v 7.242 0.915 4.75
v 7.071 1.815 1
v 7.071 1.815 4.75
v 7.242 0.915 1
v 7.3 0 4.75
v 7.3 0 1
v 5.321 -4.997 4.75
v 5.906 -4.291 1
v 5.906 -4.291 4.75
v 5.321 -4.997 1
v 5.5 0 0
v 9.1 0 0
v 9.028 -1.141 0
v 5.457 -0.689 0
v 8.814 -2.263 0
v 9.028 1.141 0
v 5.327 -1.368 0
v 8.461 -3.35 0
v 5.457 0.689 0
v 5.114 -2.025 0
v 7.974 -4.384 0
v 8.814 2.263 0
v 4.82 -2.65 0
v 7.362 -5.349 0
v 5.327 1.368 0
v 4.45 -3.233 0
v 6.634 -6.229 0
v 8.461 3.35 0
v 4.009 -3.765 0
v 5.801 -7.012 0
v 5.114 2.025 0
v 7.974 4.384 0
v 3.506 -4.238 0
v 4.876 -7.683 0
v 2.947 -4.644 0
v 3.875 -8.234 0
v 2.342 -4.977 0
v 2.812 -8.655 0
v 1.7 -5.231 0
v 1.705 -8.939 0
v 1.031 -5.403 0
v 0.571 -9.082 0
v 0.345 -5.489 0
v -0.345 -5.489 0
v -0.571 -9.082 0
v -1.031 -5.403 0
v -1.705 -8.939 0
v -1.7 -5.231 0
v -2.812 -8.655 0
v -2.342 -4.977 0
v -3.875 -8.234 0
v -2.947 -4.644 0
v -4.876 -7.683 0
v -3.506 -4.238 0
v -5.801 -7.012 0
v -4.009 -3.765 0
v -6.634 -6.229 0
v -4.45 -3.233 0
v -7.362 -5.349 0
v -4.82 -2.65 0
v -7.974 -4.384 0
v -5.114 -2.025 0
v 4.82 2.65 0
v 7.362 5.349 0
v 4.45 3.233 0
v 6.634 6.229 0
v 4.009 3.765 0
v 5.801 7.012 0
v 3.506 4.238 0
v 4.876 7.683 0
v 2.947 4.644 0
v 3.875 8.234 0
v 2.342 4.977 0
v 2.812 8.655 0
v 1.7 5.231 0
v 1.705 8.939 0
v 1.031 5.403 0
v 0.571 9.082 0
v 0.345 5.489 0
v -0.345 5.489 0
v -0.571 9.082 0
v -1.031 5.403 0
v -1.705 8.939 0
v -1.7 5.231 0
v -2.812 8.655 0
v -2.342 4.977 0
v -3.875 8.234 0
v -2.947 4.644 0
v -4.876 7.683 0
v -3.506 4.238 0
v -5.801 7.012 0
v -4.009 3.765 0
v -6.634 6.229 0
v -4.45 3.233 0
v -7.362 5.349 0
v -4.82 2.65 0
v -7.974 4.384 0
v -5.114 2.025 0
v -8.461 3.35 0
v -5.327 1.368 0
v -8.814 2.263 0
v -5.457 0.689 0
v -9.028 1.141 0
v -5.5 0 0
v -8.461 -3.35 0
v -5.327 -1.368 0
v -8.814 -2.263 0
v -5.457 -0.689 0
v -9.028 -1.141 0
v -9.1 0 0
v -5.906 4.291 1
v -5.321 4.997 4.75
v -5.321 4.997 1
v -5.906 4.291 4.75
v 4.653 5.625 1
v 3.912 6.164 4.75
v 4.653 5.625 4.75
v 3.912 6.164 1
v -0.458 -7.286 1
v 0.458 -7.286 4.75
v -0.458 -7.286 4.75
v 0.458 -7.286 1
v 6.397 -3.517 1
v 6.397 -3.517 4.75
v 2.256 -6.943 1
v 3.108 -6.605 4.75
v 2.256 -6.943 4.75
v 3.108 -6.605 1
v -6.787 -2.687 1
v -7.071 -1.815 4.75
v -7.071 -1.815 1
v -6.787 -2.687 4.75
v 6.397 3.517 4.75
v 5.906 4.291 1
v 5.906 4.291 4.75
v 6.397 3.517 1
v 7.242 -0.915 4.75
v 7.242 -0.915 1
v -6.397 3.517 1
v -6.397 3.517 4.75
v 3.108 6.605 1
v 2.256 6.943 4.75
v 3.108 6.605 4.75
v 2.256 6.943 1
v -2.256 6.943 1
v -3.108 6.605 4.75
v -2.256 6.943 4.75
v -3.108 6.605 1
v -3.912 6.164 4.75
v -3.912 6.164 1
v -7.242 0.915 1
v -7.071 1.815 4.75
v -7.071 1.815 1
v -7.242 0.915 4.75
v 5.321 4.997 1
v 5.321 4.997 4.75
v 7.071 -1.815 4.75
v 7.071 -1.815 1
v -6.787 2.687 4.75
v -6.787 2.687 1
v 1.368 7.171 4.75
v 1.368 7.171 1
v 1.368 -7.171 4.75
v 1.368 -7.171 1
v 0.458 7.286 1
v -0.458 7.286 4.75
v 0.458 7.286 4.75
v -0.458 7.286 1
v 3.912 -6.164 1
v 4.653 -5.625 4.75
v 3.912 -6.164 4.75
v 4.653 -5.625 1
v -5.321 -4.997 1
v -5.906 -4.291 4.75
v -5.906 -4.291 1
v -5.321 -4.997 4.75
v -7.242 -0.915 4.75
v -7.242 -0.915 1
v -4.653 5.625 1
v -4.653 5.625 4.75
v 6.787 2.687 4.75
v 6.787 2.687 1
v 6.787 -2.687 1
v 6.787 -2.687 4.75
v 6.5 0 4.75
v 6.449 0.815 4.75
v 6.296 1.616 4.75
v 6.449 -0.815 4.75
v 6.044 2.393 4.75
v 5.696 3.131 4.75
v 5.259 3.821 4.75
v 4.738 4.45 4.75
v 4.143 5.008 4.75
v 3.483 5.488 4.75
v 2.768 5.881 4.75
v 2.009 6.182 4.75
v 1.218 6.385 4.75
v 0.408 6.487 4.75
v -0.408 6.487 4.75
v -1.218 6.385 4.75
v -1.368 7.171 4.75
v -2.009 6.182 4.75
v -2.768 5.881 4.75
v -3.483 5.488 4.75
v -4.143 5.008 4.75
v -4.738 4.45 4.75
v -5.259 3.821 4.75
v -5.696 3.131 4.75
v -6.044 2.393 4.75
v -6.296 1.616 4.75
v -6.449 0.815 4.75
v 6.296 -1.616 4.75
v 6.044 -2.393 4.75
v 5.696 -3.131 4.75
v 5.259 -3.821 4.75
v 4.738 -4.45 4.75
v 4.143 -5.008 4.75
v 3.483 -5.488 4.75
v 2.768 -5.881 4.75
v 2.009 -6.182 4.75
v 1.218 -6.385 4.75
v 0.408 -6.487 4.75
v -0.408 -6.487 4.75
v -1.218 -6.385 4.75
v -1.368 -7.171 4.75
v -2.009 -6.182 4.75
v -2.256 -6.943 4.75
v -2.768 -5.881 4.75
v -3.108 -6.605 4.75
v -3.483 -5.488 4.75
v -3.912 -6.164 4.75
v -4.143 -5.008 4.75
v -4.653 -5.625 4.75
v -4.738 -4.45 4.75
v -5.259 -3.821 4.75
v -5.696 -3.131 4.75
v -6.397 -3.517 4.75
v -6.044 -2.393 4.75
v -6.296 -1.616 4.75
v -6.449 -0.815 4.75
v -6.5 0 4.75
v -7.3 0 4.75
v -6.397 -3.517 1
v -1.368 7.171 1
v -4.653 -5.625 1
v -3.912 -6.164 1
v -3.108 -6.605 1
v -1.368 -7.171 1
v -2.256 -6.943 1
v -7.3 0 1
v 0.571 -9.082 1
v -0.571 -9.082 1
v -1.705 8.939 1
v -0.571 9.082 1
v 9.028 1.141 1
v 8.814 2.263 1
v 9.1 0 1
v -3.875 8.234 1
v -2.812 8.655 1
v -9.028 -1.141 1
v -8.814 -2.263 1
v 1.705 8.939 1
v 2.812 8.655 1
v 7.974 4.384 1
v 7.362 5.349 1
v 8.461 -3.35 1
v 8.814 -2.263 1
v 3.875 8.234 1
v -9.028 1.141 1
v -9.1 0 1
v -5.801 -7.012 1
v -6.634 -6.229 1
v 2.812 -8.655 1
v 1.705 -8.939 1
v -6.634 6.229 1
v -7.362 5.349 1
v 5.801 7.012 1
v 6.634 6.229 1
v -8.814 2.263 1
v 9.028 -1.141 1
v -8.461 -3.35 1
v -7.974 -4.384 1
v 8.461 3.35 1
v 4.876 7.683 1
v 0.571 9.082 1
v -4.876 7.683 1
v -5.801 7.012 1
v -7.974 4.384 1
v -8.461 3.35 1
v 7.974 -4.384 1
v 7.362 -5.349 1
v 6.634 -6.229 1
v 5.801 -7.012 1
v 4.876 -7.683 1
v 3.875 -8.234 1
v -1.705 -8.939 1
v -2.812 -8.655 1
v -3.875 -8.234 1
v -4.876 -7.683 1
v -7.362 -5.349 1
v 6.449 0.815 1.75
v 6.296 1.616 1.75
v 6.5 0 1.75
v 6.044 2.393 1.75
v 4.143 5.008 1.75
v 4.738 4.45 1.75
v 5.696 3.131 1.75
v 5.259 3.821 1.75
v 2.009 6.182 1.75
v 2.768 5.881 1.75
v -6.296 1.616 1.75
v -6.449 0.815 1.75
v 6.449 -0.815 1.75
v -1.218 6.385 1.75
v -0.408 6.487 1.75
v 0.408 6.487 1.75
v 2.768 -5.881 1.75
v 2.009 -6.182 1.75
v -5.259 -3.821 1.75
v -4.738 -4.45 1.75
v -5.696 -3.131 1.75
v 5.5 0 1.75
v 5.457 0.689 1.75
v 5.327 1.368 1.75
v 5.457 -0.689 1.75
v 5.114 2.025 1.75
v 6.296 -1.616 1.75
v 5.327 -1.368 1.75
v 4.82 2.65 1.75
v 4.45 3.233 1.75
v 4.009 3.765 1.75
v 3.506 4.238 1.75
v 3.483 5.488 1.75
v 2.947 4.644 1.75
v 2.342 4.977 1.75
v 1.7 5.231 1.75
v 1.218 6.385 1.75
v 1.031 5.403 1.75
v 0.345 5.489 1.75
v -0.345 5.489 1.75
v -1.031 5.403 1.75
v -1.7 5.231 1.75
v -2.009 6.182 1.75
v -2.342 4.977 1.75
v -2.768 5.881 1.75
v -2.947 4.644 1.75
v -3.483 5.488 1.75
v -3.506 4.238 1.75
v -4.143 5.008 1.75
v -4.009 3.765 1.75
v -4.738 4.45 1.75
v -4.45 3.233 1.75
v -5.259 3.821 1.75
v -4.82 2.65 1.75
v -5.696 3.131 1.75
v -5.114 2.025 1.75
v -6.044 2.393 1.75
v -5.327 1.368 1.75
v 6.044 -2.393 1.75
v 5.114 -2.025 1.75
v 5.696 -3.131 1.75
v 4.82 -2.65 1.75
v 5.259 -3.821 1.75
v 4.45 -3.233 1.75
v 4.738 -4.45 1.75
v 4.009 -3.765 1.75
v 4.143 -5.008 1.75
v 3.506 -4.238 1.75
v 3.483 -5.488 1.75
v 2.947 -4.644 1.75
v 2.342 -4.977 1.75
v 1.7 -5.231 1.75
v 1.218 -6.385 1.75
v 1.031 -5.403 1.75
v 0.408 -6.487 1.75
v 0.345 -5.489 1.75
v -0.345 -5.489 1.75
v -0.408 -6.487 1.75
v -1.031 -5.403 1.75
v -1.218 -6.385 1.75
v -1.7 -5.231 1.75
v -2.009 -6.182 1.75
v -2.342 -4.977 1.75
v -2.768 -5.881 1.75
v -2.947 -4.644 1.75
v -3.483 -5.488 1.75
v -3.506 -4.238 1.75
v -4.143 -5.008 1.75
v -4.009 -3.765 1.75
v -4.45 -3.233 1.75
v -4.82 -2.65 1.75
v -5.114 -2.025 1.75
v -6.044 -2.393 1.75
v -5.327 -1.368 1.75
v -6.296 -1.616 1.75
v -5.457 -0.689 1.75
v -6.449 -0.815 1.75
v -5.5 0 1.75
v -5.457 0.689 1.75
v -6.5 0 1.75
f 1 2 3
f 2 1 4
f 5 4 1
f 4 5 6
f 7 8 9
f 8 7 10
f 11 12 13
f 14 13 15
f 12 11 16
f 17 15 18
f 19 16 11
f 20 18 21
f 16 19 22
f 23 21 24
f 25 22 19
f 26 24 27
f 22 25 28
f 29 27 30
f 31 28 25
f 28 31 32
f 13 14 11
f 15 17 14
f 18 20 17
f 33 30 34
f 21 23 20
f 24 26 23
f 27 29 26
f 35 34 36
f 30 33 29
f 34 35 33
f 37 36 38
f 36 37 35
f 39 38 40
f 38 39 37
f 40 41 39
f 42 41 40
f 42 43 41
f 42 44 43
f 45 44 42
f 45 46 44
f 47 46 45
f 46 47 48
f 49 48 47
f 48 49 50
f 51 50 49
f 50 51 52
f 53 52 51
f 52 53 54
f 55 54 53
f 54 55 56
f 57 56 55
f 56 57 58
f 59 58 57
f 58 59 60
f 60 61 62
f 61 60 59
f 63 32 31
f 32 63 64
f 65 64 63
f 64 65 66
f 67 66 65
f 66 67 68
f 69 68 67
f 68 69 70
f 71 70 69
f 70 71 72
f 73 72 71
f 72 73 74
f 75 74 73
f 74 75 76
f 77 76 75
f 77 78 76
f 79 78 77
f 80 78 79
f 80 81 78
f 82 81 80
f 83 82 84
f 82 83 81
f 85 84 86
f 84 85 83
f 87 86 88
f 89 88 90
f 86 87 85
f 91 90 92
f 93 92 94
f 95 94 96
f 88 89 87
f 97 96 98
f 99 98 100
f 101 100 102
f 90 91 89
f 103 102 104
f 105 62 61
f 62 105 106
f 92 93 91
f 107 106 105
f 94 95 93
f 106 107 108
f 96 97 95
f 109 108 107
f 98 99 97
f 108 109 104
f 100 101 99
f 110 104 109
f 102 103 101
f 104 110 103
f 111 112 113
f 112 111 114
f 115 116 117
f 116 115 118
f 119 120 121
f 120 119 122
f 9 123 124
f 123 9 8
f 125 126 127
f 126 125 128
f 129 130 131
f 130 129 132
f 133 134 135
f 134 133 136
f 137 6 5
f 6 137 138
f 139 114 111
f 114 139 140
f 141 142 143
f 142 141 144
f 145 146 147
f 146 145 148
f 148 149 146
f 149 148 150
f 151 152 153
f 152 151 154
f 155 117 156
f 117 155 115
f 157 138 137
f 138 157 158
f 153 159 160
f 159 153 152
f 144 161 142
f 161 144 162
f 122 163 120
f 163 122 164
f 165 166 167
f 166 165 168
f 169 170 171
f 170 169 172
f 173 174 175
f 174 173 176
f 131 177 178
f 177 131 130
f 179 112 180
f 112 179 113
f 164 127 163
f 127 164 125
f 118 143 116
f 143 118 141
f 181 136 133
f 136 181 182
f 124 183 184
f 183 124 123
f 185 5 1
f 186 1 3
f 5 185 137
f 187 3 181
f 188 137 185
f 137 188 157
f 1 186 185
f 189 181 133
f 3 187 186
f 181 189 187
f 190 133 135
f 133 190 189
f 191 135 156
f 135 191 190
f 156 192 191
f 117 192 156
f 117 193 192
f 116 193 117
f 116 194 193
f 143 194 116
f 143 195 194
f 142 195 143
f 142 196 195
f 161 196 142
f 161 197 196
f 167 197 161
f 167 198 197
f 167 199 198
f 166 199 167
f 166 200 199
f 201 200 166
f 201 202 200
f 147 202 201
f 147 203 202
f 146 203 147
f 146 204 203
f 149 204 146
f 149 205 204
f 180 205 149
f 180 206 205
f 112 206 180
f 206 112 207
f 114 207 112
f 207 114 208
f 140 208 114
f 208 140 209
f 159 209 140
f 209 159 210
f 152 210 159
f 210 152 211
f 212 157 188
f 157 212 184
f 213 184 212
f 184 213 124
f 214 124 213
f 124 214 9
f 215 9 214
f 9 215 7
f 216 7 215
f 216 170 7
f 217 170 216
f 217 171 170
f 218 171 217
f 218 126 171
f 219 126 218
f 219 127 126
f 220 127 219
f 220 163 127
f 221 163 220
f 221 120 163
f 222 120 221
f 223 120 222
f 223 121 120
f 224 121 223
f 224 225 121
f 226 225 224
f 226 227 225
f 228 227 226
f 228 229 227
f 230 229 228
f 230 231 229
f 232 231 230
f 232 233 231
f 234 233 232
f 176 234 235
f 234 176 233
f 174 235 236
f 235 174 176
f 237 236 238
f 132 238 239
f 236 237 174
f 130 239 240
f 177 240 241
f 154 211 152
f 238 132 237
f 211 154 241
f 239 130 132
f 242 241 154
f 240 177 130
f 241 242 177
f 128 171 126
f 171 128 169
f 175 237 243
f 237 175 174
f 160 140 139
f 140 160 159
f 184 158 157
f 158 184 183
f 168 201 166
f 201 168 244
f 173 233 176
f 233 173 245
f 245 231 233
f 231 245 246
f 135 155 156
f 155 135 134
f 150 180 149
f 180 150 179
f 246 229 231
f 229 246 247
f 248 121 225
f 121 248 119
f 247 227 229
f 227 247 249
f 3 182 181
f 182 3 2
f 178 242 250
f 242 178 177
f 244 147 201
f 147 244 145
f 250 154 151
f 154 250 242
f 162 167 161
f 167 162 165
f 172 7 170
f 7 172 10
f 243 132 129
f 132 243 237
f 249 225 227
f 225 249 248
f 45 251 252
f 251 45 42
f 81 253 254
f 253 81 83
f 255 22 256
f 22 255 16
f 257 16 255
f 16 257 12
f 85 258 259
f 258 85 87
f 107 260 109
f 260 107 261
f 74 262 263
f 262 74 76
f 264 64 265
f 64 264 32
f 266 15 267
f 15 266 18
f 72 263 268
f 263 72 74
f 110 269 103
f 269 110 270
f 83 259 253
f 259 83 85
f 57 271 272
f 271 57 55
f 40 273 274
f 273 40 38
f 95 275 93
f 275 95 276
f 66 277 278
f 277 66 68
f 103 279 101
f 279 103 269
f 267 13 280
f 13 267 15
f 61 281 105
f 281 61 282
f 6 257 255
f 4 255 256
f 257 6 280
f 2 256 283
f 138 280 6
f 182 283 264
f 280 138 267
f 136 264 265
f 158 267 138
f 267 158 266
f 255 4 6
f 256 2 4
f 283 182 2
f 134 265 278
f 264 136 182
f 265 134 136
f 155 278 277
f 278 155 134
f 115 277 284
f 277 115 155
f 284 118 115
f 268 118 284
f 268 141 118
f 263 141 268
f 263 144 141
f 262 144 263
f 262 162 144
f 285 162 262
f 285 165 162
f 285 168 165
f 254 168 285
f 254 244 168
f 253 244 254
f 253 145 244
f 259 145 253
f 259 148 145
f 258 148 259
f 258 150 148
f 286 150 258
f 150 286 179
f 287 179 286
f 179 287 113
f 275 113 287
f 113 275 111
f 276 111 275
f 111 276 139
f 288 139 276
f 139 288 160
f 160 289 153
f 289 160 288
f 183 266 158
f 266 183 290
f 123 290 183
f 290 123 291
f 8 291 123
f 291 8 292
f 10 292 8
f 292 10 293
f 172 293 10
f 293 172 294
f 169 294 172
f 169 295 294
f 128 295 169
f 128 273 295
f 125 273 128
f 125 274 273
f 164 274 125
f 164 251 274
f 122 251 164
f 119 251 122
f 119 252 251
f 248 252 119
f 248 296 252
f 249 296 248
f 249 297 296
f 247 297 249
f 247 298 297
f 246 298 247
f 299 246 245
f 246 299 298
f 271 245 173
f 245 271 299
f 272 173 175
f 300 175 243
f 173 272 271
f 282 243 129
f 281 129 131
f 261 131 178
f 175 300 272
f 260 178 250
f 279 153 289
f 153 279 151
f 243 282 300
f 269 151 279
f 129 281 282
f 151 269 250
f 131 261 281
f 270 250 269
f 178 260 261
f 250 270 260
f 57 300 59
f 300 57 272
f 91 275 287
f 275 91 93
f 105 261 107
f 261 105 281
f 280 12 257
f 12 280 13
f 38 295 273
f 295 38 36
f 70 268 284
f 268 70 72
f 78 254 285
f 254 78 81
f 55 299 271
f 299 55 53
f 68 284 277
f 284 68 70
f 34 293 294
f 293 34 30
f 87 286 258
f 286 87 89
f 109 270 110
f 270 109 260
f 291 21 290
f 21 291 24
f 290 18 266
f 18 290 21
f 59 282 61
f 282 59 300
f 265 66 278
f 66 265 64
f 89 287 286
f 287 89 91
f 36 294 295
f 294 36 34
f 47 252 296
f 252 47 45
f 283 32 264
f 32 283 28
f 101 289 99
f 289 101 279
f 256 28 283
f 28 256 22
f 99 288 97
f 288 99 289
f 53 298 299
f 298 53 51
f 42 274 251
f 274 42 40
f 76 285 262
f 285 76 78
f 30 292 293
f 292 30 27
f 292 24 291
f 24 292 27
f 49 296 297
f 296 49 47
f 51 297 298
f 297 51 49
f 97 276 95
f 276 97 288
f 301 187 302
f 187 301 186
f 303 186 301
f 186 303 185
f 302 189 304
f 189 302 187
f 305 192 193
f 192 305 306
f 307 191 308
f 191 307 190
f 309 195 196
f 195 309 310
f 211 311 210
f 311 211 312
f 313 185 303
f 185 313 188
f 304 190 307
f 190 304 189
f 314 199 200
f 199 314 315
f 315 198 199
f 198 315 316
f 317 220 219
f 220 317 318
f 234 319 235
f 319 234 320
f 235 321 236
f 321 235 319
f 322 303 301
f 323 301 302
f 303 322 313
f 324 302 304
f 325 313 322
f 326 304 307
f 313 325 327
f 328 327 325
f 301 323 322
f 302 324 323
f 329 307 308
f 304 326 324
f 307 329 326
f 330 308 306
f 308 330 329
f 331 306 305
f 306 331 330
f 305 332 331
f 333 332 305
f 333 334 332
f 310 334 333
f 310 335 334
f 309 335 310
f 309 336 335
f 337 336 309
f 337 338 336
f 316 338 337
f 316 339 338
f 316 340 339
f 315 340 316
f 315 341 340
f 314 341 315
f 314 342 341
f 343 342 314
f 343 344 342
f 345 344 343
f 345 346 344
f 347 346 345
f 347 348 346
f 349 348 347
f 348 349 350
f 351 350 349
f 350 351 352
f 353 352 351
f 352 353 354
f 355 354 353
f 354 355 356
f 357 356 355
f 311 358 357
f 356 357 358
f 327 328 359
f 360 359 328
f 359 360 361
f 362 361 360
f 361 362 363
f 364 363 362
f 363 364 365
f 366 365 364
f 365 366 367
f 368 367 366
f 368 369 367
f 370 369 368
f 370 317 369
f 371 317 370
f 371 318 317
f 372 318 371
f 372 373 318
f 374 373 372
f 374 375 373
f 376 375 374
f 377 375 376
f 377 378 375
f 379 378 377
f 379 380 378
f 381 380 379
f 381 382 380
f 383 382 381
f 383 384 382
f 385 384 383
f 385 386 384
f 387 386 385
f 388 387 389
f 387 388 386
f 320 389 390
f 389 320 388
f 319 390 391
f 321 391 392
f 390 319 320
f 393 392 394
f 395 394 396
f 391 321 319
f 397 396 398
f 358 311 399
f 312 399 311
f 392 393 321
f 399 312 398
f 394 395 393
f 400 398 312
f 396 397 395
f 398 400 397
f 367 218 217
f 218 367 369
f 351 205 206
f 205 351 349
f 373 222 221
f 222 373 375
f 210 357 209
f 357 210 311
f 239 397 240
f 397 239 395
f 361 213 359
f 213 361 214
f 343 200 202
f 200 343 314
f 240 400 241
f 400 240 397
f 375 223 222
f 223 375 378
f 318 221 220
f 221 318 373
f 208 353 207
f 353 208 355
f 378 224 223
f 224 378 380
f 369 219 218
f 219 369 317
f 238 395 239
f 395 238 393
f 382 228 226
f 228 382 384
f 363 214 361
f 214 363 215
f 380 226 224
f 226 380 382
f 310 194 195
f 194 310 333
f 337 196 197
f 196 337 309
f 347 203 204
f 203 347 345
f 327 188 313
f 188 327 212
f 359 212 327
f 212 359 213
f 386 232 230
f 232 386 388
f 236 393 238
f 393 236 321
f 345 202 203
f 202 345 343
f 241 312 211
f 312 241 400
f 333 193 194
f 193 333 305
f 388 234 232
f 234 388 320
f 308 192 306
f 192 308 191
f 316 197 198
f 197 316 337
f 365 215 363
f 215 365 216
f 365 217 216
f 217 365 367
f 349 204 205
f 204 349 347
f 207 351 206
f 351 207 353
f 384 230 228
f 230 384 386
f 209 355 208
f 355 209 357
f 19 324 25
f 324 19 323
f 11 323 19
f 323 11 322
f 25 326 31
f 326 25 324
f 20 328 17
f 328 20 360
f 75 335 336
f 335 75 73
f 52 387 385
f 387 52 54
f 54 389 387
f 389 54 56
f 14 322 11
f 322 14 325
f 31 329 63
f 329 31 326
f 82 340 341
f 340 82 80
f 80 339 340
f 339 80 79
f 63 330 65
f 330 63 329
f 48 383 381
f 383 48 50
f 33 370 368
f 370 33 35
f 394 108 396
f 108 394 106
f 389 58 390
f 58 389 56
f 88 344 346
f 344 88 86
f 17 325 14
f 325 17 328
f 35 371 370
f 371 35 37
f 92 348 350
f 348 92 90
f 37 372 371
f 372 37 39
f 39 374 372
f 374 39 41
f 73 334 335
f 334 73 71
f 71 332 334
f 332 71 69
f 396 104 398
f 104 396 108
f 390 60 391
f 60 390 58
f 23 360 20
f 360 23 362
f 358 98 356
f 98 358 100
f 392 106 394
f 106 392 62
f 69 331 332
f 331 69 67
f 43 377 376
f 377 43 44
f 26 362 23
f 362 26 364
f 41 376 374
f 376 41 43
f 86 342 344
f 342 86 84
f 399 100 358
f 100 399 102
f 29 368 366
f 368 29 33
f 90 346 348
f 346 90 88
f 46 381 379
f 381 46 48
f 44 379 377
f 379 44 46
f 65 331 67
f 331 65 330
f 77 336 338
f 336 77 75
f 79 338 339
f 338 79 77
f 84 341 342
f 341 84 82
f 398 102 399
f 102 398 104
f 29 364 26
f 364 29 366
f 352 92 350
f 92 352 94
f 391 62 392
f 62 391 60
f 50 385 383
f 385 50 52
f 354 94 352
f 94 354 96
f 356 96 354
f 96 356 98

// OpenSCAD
inner_rad = 6.5;
wall_thick = 0.8;
tab_height = 1.8;
tab_width = 1;
wall_height = 3.75;

difference(){
    union(){
        cylinder( r = inner_rad + 0.8, h = wall_height + tab_width, $fn = 50 );
        cylinder( r = inner_rad + 0.8 + tab_height, h = tab_width, $fn = 50 );
    }
    translate( [ 0, 0, wall_height + tab_width - 3 ] )
        cylinder( r = inner_rad, h = wall_height + tab_width, $fn = 50 );

    translate( [ 0, 0, -1 ] )
        cylinder( r = 5.5, h = wall_height + tab_width, $fn = 50 );
}
